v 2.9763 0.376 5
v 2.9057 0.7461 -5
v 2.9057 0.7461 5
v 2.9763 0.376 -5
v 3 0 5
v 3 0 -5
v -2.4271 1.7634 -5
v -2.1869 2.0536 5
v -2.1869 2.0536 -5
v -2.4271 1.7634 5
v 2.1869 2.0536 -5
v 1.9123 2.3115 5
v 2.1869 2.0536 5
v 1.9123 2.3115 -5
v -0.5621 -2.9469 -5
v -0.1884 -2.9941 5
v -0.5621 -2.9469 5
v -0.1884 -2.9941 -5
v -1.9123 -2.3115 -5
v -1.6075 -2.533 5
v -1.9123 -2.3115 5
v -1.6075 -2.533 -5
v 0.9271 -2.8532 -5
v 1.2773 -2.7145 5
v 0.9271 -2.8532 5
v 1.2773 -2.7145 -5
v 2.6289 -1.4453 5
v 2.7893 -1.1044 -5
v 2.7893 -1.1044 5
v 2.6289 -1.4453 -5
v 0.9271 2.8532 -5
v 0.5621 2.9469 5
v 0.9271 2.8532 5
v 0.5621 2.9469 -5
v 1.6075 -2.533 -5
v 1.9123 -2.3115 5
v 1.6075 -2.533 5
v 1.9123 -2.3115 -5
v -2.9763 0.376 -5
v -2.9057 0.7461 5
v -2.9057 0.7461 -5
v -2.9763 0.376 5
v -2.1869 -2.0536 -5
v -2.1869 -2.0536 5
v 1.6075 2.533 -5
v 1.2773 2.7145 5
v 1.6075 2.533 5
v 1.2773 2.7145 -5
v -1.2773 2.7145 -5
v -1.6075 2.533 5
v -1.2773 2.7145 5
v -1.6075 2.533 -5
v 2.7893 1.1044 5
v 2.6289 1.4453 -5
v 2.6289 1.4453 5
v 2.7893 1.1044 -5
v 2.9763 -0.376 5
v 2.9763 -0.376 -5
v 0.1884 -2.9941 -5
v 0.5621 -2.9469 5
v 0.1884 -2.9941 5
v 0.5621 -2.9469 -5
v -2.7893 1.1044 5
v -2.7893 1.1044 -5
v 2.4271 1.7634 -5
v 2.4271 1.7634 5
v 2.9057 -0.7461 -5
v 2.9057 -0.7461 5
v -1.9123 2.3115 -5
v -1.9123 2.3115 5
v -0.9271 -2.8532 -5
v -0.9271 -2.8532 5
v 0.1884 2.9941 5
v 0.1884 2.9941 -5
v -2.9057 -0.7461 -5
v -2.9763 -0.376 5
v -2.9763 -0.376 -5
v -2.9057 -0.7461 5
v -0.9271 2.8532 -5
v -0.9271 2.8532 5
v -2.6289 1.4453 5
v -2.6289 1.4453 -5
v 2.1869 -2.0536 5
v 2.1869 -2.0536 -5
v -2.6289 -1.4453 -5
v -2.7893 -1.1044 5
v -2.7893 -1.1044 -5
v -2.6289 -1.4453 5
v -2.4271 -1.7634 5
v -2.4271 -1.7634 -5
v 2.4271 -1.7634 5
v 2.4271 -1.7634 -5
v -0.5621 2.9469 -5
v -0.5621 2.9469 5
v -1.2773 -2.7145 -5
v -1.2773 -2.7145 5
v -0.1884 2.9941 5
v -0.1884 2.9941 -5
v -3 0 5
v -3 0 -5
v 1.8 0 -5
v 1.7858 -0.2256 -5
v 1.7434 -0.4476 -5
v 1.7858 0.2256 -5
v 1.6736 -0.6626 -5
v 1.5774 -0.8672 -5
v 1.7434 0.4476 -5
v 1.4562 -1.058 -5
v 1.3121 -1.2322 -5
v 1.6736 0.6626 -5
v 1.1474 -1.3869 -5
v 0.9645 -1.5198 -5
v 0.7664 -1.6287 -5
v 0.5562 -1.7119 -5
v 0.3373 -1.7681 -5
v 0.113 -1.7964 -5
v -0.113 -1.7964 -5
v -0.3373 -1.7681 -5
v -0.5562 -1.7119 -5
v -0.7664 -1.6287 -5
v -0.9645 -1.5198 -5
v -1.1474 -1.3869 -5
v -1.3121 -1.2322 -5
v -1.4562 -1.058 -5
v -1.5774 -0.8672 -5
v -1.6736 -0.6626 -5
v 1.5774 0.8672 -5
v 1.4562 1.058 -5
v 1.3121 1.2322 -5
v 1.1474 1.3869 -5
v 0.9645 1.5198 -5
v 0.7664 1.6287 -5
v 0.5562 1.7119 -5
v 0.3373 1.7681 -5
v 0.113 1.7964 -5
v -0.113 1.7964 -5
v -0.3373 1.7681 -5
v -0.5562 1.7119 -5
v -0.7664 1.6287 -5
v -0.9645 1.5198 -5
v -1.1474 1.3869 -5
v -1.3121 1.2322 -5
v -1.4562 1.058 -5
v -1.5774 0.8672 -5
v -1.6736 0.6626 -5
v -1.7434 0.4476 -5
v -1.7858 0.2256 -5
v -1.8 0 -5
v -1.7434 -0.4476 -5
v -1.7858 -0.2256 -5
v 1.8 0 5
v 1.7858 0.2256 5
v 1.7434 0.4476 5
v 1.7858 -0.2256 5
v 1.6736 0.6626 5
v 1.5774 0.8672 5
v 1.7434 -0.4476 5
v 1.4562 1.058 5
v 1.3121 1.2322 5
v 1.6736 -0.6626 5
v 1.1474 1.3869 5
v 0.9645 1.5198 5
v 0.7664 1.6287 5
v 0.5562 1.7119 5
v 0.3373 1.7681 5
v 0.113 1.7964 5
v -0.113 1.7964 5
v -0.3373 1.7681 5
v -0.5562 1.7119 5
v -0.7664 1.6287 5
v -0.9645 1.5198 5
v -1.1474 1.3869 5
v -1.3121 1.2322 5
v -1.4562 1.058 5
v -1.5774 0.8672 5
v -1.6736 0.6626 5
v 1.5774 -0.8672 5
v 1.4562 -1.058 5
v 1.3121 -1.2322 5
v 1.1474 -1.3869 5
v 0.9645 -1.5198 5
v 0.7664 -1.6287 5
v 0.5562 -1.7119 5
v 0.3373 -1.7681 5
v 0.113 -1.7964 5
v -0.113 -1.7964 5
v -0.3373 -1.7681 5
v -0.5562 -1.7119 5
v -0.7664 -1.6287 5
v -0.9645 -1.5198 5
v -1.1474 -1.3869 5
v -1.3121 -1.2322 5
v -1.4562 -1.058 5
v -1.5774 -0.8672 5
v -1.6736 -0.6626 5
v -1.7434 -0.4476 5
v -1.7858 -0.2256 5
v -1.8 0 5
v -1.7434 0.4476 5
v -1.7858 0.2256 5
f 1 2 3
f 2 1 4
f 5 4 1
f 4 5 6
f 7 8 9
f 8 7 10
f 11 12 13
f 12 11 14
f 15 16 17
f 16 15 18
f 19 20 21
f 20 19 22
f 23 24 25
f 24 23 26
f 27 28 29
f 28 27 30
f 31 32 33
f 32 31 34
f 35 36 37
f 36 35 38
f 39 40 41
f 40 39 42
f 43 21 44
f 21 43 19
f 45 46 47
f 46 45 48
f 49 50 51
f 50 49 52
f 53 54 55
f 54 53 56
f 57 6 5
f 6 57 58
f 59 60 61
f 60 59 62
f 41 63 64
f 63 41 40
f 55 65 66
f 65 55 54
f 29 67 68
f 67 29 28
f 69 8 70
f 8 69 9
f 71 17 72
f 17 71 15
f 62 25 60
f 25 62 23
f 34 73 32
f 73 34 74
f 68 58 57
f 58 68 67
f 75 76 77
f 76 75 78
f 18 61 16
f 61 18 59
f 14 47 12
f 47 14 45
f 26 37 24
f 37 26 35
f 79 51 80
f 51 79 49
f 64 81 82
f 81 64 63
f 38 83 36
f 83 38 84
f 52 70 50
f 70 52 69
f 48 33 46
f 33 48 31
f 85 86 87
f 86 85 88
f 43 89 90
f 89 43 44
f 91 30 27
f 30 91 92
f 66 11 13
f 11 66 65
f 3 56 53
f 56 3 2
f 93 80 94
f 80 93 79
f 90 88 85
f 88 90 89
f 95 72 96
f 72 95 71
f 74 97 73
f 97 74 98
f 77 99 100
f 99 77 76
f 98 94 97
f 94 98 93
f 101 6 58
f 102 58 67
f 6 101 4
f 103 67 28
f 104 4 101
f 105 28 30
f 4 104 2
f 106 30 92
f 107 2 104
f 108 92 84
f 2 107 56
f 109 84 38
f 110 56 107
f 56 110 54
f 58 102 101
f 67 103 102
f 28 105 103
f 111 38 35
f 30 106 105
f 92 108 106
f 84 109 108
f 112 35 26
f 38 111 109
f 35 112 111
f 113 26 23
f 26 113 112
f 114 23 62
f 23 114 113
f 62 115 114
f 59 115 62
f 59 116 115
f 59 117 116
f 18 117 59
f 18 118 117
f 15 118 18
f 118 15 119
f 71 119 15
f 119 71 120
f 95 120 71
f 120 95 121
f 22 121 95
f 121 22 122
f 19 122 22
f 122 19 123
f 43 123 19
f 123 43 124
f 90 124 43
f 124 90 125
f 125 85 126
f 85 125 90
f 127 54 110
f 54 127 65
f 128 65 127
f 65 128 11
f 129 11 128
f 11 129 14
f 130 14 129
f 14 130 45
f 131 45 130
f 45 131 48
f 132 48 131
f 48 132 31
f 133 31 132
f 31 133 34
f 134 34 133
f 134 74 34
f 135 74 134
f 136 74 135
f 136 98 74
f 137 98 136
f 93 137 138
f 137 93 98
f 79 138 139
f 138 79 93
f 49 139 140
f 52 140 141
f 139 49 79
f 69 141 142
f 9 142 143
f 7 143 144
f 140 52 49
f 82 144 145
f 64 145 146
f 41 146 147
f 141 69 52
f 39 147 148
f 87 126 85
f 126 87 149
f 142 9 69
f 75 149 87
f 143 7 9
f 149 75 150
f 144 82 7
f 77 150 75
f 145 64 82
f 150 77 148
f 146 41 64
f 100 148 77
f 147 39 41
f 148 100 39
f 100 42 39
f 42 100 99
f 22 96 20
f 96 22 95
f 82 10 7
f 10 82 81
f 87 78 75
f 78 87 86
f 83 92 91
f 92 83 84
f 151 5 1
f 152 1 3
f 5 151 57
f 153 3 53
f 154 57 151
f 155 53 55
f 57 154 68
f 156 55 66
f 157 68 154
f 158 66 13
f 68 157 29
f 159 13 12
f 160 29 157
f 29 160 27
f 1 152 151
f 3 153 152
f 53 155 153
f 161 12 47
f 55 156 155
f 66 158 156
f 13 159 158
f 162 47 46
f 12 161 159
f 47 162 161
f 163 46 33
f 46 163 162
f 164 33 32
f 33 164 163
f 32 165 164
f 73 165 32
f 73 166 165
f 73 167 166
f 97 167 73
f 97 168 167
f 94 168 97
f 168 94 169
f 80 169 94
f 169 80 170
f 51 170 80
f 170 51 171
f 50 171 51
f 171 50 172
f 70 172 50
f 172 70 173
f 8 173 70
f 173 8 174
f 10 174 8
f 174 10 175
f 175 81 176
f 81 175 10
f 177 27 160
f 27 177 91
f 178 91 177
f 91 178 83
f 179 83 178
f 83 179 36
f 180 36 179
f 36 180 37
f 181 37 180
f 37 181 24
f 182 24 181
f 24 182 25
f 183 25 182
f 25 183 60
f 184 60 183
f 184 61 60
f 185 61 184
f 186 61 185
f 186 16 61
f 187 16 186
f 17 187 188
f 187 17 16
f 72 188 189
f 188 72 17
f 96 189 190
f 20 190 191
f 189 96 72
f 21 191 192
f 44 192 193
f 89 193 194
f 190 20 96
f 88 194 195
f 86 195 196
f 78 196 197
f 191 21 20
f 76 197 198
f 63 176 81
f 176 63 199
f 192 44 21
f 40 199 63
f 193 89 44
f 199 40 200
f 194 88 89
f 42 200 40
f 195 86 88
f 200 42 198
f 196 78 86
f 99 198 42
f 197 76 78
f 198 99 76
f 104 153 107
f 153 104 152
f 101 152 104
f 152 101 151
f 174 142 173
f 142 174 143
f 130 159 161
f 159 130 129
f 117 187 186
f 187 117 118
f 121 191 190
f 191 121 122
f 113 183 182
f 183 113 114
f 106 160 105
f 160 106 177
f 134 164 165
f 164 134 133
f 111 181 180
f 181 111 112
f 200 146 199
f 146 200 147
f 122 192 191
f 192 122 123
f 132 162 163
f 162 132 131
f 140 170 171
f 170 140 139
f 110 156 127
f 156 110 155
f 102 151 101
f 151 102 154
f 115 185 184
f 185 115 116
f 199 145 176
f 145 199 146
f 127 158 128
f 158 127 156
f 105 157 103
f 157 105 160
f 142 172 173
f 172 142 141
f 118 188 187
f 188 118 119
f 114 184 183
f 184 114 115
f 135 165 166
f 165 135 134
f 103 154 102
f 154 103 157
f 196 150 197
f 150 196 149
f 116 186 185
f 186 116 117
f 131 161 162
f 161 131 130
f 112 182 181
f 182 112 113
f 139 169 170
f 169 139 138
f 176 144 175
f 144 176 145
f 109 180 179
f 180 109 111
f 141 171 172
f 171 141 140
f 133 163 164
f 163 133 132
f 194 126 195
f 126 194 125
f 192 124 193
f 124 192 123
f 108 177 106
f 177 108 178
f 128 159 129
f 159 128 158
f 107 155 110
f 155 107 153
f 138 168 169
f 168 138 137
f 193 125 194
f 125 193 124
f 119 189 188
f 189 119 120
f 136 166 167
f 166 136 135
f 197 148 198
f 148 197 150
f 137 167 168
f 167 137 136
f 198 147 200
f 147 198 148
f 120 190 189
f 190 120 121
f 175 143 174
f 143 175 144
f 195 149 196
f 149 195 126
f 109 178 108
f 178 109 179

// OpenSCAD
$fn = 50;


difference() {
	union() {
		translate(v = [0, 0, -5.0000000000]) {
			cylinder(h = 10, r = 3.0000000000);
		}
	}
	union() {
		#translate(v = [0, 0, -100.0000000000]) {
			cylinder(h = 200, r = 1.8000000000);
		}
	}
}
